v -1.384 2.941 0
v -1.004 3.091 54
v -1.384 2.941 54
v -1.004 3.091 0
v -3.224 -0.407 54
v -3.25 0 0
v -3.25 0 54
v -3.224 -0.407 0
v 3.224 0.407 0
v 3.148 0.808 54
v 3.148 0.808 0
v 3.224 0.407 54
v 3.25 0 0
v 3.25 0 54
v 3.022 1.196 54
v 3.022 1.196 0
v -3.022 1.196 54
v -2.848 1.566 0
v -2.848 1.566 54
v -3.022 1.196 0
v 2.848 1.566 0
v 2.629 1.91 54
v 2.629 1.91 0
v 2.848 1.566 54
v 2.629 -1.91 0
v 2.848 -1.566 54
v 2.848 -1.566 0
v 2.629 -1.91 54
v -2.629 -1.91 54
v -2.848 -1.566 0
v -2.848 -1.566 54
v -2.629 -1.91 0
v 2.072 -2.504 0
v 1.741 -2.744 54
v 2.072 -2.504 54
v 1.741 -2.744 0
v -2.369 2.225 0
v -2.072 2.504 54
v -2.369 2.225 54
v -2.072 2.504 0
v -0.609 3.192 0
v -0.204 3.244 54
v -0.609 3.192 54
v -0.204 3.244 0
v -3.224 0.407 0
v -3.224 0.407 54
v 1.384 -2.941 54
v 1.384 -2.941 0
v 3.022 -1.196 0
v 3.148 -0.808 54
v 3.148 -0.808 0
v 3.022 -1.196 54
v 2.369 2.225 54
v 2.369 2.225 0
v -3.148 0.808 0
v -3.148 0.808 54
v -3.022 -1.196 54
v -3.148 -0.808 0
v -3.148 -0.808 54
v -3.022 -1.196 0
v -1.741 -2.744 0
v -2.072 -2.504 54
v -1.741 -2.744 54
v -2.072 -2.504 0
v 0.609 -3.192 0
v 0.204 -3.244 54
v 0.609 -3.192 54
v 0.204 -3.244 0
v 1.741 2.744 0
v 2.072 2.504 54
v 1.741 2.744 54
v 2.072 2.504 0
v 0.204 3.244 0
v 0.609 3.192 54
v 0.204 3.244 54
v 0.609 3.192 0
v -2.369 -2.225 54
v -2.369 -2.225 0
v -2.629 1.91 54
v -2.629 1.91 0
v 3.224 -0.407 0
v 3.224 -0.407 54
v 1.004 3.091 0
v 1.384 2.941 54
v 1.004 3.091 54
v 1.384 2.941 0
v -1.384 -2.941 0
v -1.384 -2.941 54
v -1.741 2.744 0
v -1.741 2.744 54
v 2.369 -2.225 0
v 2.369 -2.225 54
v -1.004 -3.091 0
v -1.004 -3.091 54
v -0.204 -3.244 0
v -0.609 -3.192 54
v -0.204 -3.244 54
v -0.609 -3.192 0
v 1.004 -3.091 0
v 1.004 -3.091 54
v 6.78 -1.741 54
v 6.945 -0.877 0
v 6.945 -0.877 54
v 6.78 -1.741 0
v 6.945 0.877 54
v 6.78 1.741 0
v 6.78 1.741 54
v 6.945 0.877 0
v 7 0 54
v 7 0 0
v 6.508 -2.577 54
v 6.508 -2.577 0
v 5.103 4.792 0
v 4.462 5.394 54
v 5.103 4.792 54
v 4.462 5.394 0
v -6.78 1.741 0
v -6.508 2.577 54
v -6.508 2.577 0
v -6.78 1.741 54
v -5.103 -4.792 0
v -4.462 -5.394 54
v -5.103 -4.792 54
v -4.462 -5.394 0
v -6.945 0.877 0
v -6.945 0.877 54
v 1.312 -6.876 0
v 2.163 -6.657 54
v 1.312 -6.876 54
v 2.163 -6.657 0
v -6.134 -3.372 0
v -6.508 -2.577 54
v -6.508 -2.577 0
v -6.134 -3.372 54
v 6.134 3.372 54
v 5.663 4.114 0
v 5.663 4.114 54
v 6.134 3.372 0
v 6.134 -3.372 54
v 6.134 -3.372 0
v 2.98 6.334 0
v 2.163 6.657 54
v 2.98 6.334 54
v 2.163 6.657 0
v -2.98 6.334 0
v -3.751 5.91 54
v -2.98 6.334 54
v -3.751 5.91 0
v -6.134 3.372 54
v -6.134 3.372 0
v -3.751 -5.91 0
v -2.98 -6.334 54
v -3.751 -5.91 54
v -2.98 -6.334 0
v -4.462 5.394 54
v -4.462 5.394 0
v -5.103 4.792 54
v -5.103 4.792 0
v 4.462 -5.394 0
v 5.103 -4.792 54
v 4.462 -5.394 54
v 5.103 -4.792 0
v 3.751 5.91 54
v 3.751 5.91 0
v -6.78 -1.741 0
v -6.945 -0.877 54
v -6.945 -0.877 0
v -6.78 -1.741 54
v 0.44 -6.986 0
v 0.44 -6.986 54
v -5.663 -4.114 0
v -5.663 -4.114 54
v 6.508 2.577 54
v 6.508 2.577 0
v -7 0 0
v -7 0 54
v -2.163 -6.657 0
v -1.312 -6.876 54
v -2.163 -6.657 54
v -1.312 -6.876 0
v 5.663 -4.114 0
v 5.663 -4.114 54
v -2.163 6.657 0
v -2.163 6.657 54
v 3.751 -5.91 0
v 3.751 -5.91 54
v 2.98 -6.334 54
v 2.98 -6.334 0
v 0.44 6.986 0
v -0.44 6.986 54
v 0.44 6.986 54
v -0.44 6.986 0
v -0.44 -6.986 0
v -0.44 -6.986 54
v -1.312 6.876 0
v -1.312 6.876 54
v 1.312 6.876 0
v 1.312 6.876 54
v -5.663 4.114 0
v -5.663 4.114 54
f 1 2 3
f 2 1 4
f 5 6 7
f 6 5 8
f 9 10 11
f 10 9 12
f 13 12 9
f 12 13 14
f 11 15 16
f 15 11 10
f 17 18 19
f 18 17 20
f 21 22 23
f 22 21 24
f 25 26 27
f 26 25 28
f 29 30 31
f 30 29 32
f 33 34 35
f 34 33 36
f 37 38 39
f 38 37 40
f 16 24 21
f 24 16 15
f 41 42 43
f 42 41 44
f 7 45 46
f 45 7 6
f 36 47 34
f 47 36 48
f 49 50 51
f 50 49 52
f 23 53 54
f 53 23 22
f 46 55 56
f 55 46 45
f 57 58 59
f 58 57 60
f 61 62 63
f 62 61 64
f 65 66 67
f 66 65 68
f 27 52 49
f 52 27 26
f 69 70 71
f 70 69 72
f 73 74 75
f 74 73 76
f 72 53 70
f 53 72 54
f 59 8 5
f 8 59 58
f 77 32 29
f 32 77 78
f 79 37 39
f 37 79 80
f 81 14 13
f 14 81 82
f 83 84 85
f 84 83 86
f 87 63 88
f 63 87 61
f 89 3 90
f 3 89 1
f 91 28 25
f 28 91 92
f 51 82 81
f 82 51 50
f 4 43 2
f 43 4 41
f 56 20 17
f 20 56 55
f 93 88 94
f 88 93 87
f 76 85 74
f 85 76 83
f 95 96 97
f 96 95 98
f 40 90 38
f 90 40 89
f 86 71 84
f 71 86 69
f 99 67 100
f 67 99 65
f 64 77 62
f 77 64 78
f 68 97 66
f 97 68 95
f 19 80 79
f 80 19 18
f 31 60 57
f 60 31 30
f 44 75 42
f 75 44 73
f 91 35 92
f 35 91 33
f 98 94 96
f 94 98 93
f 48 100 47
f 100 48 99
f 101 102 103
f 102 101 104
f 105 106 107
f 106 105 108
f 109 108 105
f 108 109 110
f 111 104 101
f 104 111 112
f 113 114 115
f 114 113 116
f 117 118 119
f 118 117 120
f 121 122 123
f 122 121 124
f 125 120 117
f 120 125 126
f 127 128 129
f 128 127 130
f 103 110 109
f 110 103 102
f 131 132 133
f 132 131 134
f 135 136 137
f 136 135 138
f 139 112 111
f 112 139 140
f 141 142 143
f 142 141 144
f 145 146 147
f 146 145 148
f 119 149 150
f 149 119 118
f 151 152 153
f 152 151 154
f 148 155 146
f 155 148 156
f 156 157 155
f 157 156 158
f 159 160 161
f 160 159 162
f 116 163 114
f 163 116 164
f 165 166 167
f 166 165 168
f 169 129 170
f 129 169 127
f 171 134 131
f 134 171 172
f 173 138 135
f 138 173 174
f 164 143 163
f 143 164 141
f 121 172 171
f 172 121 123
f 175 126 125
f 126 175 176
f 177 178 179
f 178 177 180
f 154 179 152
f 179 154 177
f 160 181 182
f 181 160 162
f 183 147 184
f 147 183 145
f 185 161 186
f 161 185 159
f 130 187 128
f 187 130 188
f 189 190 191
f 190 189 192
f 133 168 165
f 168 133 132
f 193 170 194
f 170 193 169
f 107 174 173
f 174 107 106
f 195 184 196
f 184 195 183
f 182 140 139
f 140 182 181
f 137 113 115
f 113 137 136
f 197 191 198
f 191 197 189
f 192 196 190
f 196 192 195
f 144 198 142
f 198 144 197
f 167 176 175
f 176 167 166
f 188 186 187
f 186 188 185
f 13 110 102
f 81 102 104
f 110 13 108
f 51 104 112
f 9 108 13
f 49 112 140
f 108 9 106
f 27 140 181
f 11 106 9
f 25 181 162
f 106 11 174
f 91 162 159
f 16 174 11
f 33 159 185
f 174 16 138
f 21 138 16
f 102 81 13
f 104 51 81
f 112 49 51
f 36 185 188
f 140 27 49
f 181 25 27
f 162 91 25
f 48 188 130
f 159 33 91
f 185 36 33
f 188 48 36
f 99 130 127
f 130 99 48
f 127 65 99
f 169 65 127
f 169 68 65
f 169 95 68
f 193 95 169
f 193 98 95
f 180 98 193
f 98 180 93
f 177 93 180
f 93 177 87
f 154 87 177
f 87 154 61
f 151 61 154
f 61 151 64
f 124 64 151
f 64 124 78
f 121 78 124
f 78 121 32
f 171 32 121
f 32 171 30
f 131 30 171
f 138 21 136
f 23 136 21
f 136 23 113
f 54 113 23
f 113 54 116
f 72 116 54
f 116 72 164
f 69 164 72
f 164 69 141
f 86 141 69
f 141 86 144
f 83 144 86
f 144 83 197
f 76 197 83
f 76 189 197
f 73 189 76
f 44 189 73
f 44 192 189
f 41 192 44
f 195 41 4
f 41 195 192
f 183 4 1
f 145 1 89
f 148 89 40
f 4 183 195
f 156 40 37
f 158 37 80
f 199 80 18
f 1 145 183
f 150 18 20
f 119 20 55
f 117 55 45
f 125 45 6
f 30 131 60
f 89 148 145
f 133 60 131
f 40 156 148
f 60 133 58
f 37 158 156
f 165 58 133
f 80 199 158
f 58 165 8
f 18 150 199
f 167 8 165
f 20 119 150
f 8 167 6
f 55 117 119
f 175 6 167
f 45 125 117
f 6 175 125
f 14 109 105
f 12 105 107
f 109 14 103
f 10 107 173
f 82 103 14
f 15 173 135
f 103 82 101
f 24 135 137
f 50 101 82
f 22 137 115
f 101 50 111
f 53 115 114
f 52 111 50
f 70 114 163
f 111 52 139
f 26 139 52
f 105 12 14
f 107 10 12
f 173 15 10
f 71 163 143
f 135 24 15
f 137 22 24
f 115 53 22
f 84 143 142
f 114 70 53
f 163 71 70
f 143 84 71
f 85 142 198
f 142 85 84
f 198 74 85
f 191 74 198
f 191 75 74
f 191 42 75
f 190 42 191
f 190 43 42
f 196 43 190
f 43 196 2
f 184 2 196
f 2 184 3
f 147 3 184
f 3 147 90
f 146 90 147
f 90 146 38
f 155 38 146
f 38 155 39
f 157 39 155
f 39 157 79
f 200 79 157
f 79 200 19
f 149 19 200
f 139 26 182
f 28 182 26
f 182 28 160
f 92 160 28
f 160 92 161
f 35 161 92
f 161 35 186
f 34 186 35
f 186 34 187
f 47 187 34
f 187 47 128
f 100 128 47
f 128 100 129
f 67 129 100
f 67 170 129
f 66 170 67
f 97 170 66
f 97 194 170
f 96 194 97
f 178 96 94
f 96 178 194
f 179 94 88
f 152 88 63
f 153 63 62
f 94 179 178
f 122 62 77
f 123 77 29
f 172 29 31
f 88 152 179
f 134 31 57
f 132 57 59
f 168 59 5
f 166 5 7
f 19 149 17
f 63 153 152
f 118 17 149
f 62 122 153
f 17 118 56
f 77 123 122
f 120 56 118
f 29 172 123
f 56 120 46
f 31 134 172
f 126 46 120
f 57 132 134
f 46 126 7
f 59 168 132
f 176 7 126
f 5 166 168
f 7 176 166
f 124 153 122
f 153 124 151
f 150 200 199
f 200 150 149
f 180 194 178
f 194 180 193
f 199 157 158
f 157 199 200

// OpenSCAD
$fn = 50;


difference() {
	union() {
		*color(alpha = 1.0000000000, c = "gray") {
			translate(v = [0, 7, 0]) {
				linear_extrude(height = 1) {
					text(font = "Arial:style=Bold", halign = "center", size = 4.5000000000, text = "COMMENT plate main", valign = "center");
				}
			}
		}
		cylinder(h = 54, r = 7.0000000000);
	}
	union() {
		*color(alpha = 1.0000000000, c = "gray") {
			translate(v = [0, 7, 0]) {
				linear_extrude(height = 1) {
					text(font = "Arial:style=Bold", halign = "center", size = 4.5000000000, text = "COMMENT holes main", valign = "center");
				}
			}
		}
		translate(v = [0, 0, -100]) {
			cylinder(h = 200, r = 3.2500000000);
		}
		translate(v = [0, 0, -100]) {
			cylinder(h = 200, r = 1.8000000000);
		}
	}
}
